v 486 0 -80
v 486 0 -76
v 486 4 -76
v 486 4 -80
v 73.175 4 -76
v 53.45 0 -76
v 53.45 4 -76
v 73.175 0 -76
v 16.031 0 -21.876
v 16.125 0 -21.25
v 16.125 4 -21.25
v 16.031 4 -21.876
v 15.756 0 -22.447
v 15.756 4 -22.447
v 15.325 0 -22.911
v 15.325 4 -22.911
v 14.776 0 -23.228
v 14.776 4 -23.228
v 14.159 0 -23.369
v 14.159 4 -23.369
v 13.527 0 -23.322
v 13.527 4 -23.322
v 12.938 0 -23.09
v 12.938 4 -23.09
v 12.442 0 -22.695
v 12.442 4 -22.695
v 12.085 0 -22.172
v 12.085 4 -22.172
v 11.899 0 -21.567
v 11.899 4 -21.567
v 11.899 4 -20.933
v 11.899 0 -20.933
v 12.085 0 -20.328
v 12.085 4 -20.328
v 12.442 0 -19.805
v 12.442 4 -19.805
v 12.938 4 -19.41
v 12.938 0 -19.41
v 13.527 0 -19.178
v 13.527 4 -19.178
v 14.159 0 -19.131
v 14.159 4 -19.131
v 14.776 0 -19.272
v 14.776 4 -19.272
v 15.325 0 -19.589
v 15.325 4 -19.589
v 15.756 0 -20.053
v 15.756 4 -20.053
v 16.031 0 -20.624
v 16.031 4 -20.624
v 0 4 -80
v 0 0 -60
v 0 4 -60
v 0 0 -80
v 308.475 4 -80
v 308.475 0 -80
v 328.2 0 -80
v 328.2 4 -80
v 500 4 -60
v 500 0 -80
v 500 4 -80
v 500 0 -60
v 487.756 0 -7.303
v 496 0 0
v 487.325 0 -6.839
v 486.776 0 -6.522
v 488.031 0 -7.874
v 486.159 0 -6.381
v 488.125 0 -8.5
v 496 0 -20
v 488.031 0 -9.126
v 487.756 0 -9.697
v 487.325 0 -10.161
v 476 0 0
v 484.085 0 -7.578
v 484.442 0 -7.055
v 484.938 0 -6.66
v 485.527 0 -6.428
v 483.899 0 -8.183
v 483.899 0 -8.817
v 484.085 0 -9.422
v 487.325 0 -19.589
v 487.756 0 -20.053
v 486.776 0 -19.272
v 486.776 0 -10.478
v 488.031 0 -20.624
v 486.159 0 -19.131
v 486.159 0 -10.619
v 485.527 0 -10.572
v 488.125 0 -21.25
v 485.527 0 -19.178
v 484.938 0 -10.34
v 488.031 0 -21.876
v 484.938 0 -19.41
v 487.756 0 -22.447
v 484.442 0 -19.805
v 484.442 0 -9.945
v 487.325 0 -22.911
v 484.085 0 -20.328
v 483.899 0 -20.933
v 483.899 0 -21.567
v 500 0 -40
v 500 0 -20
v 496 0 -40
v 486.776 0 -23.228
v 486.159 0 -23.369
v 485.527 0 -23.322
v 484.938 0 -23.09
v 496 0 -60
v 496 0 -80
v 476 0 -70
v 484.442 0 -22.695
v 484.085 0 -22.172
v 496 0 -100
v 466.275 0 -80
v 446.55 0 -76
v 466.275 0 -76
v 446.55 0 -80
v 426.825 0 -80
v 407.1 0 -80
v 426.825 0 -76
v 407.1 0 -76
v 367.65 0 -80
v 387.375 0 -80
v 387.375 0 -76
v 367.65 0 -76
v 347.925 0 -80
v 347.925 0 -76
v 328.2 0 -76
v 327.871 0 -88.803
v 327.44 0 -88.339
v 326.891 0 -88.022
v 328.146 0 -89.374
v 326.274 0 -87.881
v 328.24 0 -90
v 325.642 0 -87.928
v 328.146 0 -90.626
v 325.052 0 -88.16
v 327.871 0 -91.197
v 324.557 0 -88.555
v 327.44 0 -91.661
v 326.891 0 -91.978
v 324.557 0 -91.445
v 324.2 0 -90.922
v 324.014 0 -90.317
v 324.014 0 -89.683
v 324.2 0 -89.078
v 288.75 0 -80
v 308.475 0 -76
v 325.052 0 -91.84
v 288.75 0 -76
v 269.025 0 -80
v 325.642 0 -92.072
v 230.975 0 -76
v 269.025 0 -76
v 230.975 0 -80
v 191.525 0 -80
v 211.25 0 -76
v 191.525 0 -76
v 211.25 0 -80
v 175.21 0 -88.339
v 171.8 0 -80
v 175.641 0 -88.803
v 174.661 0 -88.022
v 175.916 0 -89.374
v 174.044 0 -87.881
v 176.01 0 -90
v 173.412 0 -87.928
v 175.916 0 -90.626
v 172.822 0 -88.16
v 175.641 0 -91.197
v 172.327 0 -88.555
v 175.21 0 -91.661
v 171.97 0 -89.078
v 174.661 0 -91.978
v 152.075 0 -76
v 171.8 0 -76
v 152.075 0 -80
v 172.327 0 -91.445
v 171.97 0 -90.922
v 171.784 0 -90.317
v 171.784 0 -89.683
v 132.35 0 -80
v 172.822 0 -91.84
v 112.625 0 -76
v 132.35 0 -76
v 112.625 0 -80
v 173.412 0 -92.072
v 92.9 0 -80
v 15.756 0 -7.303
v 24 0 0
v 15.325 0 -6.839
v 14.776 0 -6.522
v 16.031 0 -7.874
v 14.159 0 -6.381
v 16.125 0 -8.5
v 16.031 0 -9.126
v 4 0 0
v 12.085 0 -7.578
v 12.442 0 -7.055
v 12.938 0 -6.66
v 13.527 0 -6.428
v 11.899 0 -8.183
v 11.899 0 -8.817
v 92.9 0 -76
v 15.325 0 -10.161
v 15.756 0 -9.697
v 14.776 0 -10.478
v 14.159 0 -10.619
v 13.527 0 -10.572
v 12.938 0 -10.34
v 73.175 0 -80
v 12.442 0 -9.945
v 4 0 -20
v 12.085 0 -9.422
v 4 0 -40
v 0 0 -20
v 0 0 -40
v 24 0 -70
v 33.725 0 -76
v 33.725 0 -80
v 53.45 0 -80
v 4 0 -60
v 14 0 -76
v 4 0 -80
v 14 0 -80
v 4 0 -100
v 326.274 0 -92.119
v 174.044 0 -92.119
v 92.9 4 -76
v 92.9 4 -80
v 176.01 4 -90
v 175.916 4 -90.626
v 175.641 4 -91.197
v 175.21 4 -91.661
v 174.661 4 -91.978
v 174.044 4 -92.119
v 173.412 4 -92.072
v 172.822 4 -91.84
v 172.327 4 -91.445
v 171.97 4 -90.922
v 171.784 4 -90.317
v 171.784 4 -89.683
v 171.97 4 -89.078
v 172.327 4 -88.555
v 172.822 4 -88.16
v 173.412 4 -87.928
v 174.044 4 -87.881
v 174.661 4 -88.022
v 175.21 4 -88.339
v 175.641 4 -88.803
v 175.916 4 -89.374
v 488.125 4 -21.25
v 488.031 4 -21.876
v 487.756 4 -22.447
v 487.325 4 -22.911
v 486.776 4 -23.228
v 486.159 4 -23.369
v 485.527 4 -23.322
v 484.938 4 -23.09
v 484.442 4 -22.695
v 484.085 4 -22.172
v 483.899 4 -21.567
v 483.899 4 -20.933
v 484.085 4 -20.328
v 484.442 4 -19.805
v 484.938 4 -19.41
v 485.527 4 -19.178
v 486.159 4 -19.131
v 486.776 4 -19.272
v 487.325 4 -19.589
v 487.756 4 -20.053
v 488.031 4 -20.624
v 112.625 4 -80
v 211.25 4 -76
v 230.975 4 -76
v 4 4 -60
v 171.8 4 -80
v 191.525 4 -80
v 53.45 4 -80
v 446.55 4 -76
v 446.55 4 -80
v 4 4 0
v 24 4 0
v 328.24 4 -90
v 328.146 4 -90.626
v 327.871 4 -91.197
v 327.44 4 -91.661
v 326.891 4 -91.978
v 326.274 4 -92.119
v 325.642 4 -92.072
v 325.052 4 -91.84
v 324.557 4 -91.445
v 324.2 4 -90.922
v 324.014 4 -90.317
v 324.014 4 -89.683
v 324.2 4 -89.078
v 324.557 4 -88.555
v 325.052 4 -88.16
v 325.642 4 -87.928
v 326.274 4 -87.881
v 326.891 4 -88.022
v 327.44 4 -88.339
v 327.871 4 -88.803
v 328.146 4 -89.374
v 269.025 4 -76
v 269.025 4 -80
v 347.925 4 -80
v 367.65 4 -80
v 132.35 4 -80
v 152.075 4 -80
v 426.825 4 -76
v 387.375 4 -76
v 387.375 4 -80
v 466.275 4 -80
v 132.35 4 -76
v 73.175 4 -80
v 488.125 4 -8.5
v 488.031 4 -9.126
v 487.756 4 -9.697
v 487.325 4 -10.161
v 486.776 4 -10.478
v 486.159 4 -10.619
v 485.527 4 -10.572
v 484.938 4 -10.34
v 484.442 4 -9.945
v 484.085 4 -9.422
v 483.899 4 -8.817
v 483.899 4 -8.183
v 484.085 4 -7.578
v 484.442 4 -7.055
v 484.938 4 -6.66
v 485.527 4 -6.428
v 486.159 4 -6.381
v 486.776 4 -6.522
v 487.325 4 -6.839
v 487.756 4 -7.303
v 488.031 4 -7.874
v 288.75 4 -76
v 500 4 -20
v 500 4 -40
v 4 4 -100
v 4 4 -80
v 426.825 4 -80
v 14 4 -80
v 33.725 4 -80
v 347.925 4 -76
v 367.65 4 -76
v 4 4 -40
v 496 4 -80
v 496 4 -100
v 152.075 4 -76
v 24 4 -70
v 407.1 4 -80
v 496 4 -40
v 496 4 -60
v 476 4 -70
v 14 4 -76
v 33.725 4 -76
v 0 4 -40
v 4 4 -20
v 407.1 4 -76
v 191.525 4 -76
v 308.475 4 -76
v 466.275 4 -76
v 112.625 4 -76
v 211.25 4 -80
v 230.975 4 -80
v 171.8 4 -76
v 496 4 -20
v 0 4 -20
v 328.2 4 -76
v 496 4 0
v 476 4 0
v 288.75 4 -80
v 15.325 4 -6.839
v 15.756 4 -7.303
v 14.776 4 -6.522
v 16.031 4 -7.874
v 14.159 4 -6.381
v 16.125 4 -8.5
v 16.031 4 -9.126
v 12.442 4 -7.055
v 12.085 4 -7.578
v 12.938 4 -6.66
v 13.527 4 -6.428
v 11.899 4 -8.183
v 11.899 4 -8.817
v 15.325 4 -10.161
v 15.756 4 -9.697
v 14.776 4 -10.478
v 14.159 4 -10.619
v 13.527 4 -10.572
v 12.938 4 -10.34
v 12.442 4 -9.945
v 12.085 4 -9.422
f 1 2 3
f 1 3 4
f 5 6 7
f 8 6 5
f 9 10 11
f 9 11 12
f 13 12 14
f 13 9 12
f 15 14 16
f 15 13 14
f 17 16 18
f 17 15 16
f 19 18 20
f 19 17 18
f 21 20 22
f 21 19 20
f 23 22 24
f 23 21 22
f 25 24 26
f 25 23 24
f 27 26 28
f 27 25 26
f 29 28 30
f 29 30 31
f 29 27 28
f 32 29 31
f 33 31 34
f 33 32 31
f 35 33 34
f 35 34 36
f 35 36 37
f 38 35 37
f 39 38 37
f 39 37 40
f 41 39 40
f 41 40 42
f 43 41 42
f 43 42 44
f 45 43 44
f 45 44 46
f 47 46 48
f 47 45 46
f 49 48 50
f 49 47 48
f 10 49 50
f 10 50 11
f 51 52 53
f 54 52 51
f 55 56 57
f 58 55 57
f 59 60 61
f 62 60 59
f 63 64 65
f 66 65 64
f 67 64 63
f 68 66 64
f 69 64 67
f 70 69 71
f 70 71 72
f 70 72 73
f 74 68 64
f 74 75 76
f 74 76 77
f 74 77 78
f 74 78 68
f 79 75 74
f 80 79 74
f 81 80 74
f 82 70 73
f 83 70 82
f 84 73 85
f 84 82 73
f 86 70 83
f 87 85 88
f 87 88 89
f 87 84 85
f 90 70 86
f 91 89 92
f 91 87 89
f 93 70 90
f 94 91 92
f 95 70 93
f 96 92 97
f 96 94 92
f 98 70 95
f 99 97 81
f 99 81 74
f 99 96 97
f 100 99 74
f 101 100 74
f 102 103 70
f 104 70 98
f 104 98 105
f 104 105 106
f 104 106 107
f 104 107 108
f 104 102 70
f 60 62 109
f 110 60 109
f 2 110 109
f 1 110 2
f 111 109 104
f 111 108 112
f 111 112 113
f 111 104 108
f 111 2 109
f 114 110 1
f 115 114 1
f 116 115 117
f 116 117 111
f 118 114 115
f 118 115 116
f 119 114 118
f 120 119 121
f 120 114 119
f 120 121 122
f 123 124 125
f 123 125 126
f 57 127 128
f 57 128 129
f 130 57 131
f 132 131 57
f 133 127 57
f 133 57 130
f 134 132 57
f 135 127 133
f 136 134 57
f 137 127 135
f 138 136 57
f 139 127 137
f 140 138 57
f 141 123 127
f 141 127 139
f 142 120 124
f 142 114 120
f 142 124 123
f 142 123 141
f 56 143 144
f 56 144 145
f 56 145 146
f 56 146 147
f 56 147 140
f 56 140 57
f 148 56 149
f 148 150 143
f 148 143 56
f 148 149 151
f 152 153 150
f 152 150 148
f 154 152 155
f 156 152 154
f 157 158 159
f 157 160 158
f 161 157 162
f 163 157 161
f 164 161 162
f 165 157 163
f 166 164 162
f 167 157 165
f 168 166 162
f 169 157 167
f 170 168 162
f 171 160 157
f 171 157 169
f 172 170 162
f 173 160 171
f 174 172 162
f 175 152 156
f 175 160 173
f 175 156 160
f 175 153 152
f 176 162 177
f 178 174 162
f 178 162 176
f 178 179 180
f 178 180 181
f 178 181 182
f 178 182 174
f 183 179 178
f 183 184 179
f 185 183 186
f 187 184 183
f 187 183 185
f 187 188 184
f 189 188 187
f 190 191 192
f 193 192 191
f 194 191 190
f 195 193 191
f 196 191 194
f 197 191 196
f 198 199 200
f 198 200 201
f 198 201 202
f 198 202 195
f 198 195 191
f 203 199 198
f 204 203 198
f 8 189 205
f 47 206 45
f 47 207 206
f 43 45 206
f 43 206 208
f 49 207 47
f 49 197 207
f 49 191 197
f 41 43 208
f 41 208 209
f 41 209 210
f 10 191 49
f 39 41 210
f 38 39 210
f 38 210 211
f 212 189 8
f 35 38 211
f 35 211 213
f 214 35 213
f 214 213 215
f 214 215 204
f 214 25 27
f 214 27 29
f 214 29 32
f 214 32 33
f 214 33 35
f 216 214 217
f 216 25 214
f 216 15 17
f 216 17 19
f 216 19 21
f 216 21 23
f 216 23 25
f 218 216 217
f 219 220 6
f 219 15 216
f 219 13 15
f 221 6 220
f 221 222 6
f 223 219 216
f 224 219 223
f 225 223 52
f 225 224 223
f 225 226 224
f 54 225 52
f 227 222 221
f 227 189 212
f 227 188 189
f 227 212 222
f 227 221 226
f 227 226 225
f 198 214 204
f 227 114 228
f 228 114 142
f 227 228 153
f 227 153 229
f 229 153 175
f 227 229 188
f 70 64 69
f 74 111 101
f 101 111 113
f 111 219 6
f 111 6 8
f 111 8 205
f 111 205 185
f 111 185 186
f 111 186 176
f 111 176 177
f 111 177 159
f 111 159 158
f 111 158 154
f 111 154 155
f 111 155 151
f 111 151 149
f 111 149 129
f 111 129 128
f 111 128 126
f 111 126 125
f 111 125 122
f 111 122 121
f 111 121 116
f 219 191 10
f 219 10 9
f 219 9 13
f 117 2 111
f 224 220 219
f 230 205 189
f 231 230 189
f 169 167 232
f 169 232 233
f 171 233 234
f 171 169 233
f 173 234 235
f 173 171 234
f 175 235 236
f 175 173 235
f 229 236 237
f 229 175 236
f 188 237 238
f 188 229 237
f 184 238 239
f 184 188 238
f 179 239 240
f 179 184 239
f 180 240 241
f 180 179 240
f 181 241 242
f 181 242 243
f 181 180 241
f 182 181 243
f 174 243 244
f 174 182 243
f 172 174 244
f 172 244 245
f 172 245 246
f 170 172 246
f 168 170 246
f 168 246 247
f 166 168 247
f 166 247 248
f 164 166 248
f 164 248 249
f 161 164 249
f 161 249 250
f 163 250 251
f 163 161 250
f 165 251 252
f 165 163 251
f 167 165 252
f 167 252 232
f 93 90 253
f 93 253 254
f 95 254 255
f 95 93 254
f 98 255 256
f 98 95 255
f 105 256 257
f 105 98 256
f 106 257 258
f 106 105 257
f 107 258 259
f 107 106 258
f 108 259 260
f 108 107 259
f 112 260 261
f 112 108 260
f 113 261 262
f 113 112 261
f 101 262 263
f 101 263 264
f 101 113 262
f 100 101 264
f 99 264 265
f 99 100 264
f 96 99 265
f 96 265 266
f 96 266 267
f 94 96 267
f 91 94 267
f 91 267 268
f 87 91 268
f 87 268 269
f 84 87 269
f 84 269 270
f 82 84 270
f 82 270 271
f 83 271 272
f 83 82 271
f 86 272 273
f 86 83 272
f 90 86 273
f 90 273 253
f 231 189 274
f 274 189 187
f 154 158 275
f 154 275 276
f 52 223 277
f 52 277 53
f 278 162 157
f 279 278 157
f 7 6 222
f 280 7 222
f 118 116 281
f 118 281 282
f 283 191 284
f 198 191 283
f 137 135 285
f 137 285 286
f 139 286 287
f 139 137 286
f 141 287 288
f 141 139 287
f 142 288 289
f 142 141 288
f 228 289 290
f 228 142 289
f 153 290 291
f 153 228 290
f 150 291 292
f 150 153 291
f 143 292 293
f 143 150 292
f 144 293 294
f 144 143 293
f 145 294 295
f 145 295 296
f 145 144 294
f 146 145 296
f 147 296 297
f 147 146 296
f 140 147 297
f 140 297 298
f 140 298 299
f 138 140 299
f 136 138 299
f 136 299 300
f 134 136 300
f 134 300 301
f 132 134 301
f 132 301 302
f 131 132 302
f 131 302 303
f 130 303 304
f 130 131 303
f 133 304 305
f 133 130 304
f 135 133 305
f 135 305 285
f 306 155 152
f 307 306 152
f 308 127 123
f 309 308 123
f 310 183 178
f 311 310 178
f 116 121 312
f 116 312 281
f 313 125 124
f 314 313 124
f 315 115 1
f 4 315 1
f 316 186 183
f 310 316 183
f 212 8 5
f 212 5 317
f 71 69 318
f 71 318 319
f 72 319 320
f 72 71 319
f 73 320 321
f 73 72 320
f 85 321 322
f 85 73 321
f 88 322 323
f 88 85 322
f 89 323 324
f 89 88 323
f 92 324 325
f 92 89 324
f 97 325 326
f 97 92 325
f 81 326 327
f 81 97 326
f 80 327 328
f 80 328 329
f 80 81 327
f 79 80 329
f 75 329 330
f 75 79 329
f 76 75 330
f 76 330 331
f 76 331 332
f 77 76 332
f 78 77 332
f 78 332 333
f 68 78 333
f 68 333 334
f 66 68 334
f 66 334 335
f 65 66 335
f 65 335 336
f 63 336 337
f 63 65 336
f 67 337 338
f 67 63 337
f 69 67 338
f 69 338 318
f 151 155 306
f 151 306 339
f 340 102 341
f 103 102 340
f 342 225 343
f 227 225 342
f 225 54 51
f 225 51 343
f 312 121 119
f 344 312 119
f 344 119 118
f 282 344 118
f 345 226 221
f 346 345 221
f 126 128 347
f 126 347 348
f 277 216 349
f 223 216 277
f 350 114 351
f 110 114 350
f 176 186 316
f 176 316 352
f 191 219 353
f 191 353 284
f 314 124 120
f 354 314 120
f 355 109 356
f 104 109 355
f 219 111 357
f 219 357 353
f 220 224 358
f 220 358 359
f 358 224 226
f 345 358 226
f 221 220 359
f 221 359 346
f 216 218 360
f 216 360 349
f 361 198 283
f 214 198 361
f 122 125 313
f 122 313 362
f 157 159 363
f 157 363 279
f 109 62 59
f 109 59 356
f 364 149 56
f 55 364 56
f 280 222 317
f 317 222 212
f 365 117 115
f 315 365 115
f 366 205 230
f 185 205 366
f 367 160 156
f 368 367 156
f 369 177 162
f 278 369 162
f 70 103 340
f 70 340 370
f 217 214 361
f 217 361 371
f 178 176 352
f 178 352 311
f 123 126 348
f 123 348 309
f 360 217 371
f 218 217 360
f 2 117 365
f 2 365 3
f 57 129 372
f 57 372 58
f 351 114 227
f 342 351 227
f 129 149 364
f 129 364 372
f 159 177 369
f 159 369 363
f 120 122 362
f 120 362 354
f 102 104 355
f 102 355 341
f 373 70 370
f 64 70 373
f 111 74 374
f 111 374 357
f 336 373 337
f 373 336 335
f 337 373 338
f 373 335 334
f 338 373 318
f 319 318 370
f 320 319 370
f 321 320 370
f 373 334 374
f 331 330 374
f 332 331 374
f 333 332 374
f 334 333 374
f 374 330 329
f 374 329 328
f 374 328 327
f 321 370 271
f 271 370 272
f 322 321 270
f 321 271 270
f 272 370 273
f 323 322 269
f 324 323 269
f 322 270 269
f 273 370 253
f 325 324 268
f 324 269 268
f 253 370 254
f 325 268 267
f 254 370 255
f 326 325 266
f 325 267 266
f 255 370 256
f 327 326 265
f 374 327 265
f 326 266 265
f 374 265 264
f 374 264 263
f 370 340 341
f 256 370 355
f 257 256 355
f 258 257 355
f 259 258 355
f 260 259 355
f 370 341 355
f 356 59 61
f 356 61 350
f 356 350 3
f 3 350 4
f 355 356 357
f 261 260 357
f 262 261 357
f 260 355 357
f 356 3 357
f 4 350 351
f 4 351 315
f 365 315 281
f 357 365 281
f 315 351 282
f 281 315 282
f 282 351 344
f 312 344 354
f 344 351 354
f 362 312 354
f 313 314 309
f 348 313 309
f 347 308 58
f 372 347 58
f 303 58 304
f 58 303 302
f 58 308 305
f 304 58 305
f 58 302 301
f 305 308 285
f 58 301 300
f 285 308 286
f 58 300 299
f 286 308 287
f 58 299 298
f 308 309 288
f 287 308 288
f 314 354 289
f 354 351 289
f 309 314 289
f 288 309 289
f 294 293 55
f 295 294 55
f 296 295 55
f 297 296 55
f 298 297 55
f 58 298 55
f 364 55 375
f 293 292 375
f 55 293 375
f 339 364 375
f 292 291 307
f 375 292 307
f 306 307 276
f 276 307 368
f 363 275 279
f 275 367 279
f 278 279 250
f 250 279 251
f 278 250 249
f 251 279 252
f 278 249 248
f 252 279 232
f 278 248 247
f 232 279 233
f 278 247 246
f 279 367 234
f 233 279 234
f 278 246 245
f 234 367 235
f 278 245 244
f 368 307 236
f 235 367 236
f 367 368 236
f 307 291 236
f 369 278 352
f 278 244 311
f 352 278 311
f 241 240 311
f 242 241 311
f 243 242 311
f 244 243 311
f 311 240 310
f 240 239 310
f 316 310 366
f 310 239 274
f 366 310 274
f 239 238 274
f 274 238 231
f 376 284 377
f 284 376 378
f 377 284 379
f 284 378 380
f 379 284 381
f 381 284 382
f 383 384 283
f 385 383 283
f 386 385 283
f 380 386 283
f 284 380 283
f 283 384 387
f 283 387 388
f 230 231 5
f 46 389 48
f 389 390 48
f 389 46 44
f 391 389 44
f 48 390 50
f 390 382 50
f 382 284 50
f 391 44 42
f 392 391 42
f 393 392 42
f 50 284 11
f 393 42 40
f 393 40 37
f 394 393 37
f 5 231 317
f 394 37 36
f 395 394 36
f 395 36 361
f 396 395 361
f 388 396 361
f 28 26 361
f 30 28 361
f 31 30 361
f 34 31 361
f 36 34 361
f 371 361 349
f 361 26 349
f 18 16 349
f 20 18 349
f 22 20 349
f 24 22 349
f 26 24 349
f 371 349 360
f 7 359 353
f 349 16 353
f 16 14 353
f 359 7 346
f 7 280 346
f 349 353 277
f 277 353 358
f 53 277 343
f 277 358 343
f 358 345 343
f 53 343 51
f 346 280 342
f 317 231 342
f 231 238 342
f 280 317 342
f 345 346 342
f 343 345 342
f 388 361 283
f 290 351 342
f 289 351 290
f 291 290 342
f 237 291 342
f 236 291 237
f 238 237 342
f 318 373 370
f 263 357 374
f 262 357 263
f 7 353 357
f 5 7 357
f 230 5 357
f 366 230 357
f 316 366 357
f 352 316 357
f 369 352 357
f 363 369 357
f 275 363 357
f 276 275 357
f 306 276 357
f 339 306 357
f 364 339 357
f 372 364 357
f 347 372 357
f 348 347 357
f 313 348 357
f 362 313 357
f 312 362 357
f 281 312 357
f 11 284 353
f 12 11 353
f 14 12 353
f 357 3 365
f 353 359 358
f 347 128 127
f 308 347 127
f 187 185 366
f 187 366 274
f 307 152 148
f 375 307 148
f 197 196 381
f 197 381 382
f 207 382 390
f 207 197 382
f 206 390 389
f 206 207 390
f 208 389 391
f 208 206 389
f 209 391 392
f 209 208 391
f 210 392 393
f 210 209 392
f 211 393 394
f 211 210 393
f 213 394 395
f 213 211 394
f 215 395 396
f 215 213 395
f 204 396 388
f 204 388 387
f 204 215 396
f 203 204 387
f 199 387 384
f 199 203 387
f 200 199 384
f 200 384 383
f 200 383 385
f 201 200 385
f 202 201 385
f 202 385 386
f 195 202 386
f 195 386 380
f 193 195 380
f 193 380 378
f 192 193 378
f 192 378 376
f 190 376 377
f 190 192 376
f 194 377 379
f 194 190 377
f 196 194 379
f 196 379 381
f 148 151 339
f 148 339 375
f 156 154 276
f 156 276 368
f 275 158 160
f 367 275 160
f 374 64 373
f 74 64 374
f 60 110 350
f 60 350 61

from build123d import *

# Parameters (mm, degrees)
SKETCH1_R           = 2.125
SKETCH1_W           = 19.725
SKETCH1_H           = 4
BOSS_EXTRUDE1_DEPTH = 4


with BuildPart() as part:
    # Sketch1 → Boss-Extrude1 (new body)
    with BuildSketch(Plane(origin=(0, 0, 0), x_dir=(1, 0, 0), z_dir=(0, 1, 0))):
        Polygon((4, 0), (4, 20), (0, 20), (0, 40), (4, 40), (4, 60), (0, 60), (0, 80), (4, 80), (4, 100), (250, 100), (496, 100), (496, 80), (500, 80), (500, 60), (496, 60), (496, 40), (500, 40), (500, 20), (496, 20), (496, 0), (476, 0), (476, 70), (24, 70), (24, 0), align=None)
        with Locations((14, 8.5)):
            Circle(SKETCH1_R, mode=Mode.SUBTRACT)
        with Locations((14, 21.25)):
            Circle(SKETCH1_R, mode=Mode.SUBTRACT)
        with Locations((173.885, 90)):
            Circle(SKETCH1_R, mode=Mode.SUBTRACT)
        with Locations((326.115, 90)):
            Circle(SKETCH1_R, mode=Mode.SUBTRACT)
        with Locations((486, 21.25)):
            Circle(SKETCH1_R, mode=Mode.SUBTRACT)
        with Locations((486, 8.5)):
            Circle(SKETCH1_R, mode=Mode.SUBTRACT)
        with Locations((63.3125, 78)):
            Rectangle(SKETCH1_W, SKETCH1_H, mode=Mode.SUBTRACT)
        with Locations((23.8625, 78)):
            Rectangle(SKETCH1_W, SKETCH1_H, mode=Mode.SUBTRACT)
        with Locations((102.7625, 78)):
            Rectangle(SKETCH1_W, SKETCH1_H, mode=Mode.SUBTRACT)
        with Locations((142.2125, 78)):
            Rectangle(SKETCH1_W, SKETCH1_H, mode=Mode.SUBTRACT)
        with Locations((181.6625, 78)):
            Rectangle(SKETCH1_W, SKETCH1_H, mode=Mode.SUBTRACT)
        with Locations((221.1125, 78)):
            Rectangle(SKETCH1_W, SKETCH1_H, mode=Mode.SUBTRACT)
        with Locations((278.8875, 78)):
            Rectangle(SKETCH1_W, SKETCH1_H, mode=Mode.SUBTRACT)
        with Locations((318.3375, 78)):
            Rectangle(SKETCH1_W, SKETCH1_H, mode=Mode.SUBTRACT)
        with Locations((357.7875, 78)):
            Rectangle(SKETCH1_W, SKETCH1_H, mode=Mode.SUBTRACT)
        with Locations((397.2375, 78)):
            Rectangle(SKETCH1_W, SKETCH1_H, mode=Mode.SUBTRACT)
        with Locations((436.6875, 78)):
            Rectangle(SKETCH1_W, SKETCH1_H, mode=Mode.SUBTRACT)
        with Locations((476.1375, 78)):
            Rectangle(SKETCH1_W, SKETCH1_H, mode=Mode.SUBTRACT)
    extrude(amount=BOSS_EXTRUDE1_DEPTH)


solid = part.part
